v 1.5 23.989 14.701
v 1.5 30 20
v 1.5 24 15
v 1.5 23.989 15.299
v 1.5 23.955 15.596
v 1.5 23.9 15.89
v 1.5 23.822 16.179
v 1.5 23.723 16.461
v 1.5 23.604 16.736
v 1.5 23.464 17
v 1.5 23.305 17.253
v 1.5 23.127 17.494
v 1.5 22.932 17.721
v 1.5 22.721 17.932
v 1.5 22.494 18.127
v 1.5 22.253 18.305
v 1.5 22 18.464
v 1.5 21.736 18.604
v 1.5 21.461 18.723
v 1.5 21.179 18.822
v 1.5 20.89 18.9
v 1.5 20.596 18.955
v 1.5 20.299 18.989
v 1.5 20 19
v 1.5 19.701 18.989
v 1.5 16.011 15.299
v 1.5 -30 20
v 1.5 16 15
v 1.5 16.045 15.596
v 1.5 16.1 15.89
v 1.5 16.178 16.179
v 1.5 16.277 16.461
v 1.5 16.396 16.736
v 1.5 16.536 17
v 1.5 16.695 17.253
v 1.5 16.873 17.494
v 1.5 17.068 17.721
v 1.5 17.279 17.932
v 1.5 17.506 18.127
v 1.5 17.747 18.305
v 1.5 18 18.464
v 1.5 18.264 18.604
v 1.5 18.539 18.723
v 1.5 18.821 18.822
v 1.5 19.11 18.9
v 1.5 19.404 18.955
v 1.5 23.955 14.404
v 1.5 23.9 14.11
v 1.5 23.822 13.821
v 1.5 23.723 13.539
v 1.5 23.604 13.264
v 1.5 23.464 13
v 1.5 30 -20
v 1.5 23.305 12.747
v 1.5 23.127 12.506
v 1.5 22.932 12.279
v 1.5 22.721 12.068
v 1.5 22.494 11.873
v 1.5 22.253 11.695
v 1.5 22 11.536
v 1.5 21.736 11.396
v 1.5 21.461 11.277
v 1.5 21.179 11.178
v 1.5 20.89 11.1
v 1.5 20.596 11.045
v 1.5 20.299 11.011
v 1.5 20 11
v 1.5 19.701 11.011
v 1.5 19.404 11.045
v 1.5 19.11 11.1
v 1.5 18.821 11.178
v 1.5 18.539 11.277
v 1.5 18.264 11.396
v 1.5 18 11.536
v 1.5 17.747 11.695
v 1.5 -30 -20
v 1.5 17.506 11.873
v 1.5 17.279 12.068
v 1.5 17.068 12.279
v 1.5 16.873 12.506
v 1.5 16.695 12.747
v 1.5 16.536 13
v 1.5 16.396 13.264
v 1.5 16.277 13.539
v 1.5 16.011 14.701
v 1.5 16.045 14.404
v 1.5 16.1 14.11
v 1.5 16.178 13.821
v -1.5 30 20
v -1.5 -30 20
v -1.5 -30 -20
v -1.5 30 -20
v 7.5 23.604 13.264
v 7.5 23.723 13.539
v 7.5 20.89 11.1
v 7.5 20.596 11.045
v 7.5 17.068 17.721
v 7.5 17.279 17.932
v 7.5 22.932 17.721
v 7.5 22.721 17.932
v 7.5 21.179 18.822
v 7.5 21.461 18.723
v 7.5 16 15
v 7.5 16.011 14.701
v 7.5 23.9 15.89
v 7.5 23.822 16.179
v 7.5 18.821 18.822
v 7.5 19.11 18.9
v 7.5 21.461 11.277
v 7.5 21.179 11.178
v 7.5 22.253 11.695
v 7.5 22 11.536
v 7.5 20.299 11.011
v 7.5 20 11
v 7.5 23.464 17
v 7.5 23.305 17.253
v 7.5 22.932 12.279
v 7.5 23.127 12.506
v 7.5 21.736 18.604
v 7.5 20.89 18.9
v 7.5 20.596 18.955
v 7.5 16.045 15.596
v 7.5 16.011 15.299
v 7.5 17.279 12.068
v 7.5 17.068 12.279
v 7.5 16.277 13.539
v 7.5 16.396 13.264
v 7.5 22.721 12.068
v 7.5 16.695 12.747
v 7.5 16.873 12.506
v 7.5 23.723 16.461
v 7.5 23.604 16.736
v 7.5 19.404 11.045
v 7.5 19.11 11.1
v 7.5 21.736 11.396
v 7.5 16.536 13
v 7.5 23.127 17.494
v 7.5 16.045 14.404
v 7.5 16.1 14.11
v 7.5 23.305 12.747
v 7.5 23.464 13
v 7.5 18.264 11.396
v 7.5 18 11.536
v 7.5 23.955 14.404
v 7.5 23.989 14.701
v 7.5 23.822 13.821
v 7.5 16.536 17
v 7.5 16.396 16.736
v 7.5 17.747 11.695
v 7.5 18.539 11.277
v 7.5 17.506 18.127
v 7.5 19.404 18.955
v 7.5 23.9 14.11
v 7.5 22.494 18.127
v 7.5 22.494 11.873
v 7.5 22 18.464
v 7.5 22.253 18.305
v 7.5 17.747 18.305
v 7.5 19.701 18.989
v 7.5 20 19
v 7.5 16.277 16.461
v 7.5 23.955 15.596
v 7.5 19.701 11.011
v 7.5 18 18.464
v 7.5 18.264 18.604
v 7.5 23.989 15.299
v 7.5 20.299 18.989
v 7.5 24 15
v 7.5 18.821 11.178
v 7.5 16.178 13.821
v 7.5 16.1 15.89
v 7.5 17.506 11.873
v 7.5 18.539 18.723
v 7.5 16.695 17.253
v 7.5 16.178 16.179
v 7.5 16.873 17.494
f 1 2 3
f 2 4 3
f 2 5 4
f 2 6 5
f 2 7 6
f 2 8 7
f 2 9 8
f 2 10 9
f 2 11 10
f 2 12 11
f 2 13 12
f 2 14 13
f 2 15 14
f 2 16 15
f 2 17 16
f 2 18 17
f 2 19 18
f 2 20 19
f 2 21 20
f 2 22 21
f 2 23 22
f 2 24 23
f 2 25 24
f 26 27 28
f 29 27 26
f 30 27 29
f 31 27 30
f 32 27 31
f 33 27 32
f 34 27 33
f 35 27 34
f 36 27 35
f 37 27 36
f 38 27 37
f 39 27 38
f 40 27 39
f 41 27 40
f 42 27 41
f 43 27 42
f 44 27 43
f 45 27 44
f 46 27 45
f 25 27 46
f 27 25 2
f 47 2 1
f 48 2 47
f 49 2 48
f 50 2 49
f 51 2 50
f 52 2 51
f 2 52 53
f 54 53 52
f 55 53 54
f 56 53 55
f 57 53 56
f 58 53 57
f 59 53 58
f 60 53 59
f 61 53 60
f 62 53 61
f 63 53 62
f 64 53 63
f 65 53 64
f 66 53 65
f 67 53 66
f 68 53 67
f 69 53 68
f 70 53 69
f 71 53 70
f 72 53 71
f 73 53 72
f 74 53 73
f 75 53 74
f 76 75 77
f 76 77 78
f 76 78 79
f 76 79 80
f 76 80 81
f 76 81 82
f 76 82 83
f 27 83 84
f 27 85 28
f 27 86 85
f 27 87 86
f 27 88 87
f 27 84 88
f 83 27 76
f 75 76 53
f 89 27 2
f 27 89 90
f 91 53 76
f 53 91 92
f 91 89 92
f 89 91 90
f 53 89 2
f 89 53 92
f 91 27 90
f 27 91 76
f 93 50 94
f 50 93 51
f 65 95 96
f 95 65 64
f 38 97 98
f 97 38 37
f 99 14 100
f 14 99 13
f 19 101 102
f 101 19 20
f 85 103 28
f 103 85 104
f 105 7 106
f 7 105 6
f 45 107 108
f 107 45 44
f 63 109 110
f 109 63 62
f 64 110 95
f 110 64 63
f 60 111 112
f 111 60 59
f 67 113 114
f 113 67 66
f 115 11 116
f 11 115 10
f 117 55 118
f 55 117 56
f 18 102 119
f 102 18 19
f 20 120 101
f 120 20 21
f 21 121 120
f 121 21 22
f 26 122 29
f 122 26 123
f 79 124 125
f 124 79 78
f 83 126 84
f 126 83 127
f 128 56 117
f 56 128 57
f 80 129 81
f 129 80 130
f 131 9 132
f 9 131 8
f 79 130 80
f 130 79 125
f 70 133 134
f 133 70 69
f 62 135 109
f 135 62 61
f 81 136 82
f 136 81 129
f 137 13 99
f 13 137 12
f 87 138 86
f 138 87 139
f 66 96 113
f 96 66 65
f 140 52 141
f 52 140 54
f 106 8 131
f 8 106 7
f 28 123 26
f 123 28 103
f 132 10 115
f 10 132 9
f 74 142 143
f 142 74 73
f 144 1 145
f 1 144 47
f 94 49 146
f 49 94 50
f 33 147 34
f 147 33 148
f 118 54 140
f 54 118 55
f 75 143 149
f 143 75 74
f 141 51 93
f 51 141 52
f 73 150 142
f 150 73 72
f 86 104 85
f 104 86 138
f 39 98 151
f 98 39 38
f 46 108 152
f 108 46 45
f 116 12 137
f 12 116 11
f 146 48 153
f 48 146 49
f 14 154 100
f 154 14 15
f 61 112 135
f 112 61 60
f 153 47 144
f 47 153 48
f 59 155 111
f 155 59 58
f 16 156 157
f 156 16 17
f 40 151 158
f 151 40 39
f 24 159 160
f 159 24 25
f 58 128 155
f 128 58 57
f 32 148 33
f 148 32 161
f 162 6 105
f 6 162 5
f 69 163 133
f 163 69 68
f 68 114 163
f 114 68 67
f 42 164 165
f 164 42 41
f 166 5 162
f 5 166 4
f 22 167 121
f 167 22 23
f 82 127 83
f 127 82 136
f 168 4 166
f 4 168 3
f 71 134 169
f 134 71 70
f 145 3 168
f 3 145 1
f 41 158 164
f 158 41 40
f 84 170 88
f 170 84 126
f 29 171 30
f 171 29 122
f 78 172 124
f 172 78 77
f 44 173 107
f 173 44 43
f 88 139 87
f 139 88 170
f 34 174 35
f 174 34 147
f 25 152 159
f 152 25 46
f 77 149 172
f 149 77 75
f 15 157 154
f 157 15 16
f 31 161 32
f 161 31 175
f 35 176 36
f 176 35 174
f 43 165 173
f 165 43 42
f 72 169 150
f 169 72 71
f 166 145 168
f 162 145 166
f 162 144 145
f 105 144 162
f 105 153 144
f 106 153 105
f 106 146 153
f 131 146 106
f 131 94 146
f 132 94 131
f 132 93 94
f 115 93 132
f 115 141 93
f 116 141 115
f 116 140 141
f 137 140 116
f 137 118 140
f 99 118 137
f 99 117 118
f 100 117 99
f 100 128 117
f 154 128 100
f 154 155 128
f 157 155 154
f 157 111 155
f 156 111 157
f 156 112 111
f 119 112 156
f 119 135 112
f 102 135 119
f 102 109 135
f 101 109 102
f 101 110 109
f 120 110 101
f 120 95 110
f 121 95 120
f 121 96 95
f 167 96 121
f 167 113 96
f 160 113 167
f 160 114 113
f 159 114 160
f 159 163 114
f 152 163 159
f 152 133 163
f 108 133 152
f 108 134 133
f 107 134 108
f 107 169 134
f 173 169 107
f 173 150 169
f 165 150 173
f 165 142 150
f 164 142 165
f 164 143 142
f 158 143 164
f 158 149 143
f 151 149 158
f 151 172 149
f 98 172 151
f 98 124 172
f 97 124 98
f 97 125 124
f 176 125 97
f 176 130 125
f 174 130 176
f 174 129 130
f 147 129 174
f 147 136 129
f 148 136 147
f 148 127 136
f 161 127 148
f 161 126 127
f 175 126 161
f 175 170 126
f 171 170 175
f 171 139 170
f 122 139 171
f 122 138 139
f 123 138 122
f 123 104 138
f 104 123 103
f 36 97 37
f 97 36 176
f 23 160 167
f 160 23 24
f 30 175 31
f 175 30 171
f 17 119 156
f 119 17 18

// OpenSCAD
// The correct version of attachment_missing_fail: the M3 boss the fastener
// goes through is actually modelled at the declared attachment point.

$fa = 2; $fs = 0.3;

// EXPECTED_BBOX: [9, 60, 40]

// the panel itself: thin plate at x=0
cube([3, 60, 40], center = true);

// the M3 boss, standing 6mm off the panel face at the declared point
translate([4.5, 20, 15]) rotate([0, 90, 0]) cylinder(d = 8, h = 6, center = true);
